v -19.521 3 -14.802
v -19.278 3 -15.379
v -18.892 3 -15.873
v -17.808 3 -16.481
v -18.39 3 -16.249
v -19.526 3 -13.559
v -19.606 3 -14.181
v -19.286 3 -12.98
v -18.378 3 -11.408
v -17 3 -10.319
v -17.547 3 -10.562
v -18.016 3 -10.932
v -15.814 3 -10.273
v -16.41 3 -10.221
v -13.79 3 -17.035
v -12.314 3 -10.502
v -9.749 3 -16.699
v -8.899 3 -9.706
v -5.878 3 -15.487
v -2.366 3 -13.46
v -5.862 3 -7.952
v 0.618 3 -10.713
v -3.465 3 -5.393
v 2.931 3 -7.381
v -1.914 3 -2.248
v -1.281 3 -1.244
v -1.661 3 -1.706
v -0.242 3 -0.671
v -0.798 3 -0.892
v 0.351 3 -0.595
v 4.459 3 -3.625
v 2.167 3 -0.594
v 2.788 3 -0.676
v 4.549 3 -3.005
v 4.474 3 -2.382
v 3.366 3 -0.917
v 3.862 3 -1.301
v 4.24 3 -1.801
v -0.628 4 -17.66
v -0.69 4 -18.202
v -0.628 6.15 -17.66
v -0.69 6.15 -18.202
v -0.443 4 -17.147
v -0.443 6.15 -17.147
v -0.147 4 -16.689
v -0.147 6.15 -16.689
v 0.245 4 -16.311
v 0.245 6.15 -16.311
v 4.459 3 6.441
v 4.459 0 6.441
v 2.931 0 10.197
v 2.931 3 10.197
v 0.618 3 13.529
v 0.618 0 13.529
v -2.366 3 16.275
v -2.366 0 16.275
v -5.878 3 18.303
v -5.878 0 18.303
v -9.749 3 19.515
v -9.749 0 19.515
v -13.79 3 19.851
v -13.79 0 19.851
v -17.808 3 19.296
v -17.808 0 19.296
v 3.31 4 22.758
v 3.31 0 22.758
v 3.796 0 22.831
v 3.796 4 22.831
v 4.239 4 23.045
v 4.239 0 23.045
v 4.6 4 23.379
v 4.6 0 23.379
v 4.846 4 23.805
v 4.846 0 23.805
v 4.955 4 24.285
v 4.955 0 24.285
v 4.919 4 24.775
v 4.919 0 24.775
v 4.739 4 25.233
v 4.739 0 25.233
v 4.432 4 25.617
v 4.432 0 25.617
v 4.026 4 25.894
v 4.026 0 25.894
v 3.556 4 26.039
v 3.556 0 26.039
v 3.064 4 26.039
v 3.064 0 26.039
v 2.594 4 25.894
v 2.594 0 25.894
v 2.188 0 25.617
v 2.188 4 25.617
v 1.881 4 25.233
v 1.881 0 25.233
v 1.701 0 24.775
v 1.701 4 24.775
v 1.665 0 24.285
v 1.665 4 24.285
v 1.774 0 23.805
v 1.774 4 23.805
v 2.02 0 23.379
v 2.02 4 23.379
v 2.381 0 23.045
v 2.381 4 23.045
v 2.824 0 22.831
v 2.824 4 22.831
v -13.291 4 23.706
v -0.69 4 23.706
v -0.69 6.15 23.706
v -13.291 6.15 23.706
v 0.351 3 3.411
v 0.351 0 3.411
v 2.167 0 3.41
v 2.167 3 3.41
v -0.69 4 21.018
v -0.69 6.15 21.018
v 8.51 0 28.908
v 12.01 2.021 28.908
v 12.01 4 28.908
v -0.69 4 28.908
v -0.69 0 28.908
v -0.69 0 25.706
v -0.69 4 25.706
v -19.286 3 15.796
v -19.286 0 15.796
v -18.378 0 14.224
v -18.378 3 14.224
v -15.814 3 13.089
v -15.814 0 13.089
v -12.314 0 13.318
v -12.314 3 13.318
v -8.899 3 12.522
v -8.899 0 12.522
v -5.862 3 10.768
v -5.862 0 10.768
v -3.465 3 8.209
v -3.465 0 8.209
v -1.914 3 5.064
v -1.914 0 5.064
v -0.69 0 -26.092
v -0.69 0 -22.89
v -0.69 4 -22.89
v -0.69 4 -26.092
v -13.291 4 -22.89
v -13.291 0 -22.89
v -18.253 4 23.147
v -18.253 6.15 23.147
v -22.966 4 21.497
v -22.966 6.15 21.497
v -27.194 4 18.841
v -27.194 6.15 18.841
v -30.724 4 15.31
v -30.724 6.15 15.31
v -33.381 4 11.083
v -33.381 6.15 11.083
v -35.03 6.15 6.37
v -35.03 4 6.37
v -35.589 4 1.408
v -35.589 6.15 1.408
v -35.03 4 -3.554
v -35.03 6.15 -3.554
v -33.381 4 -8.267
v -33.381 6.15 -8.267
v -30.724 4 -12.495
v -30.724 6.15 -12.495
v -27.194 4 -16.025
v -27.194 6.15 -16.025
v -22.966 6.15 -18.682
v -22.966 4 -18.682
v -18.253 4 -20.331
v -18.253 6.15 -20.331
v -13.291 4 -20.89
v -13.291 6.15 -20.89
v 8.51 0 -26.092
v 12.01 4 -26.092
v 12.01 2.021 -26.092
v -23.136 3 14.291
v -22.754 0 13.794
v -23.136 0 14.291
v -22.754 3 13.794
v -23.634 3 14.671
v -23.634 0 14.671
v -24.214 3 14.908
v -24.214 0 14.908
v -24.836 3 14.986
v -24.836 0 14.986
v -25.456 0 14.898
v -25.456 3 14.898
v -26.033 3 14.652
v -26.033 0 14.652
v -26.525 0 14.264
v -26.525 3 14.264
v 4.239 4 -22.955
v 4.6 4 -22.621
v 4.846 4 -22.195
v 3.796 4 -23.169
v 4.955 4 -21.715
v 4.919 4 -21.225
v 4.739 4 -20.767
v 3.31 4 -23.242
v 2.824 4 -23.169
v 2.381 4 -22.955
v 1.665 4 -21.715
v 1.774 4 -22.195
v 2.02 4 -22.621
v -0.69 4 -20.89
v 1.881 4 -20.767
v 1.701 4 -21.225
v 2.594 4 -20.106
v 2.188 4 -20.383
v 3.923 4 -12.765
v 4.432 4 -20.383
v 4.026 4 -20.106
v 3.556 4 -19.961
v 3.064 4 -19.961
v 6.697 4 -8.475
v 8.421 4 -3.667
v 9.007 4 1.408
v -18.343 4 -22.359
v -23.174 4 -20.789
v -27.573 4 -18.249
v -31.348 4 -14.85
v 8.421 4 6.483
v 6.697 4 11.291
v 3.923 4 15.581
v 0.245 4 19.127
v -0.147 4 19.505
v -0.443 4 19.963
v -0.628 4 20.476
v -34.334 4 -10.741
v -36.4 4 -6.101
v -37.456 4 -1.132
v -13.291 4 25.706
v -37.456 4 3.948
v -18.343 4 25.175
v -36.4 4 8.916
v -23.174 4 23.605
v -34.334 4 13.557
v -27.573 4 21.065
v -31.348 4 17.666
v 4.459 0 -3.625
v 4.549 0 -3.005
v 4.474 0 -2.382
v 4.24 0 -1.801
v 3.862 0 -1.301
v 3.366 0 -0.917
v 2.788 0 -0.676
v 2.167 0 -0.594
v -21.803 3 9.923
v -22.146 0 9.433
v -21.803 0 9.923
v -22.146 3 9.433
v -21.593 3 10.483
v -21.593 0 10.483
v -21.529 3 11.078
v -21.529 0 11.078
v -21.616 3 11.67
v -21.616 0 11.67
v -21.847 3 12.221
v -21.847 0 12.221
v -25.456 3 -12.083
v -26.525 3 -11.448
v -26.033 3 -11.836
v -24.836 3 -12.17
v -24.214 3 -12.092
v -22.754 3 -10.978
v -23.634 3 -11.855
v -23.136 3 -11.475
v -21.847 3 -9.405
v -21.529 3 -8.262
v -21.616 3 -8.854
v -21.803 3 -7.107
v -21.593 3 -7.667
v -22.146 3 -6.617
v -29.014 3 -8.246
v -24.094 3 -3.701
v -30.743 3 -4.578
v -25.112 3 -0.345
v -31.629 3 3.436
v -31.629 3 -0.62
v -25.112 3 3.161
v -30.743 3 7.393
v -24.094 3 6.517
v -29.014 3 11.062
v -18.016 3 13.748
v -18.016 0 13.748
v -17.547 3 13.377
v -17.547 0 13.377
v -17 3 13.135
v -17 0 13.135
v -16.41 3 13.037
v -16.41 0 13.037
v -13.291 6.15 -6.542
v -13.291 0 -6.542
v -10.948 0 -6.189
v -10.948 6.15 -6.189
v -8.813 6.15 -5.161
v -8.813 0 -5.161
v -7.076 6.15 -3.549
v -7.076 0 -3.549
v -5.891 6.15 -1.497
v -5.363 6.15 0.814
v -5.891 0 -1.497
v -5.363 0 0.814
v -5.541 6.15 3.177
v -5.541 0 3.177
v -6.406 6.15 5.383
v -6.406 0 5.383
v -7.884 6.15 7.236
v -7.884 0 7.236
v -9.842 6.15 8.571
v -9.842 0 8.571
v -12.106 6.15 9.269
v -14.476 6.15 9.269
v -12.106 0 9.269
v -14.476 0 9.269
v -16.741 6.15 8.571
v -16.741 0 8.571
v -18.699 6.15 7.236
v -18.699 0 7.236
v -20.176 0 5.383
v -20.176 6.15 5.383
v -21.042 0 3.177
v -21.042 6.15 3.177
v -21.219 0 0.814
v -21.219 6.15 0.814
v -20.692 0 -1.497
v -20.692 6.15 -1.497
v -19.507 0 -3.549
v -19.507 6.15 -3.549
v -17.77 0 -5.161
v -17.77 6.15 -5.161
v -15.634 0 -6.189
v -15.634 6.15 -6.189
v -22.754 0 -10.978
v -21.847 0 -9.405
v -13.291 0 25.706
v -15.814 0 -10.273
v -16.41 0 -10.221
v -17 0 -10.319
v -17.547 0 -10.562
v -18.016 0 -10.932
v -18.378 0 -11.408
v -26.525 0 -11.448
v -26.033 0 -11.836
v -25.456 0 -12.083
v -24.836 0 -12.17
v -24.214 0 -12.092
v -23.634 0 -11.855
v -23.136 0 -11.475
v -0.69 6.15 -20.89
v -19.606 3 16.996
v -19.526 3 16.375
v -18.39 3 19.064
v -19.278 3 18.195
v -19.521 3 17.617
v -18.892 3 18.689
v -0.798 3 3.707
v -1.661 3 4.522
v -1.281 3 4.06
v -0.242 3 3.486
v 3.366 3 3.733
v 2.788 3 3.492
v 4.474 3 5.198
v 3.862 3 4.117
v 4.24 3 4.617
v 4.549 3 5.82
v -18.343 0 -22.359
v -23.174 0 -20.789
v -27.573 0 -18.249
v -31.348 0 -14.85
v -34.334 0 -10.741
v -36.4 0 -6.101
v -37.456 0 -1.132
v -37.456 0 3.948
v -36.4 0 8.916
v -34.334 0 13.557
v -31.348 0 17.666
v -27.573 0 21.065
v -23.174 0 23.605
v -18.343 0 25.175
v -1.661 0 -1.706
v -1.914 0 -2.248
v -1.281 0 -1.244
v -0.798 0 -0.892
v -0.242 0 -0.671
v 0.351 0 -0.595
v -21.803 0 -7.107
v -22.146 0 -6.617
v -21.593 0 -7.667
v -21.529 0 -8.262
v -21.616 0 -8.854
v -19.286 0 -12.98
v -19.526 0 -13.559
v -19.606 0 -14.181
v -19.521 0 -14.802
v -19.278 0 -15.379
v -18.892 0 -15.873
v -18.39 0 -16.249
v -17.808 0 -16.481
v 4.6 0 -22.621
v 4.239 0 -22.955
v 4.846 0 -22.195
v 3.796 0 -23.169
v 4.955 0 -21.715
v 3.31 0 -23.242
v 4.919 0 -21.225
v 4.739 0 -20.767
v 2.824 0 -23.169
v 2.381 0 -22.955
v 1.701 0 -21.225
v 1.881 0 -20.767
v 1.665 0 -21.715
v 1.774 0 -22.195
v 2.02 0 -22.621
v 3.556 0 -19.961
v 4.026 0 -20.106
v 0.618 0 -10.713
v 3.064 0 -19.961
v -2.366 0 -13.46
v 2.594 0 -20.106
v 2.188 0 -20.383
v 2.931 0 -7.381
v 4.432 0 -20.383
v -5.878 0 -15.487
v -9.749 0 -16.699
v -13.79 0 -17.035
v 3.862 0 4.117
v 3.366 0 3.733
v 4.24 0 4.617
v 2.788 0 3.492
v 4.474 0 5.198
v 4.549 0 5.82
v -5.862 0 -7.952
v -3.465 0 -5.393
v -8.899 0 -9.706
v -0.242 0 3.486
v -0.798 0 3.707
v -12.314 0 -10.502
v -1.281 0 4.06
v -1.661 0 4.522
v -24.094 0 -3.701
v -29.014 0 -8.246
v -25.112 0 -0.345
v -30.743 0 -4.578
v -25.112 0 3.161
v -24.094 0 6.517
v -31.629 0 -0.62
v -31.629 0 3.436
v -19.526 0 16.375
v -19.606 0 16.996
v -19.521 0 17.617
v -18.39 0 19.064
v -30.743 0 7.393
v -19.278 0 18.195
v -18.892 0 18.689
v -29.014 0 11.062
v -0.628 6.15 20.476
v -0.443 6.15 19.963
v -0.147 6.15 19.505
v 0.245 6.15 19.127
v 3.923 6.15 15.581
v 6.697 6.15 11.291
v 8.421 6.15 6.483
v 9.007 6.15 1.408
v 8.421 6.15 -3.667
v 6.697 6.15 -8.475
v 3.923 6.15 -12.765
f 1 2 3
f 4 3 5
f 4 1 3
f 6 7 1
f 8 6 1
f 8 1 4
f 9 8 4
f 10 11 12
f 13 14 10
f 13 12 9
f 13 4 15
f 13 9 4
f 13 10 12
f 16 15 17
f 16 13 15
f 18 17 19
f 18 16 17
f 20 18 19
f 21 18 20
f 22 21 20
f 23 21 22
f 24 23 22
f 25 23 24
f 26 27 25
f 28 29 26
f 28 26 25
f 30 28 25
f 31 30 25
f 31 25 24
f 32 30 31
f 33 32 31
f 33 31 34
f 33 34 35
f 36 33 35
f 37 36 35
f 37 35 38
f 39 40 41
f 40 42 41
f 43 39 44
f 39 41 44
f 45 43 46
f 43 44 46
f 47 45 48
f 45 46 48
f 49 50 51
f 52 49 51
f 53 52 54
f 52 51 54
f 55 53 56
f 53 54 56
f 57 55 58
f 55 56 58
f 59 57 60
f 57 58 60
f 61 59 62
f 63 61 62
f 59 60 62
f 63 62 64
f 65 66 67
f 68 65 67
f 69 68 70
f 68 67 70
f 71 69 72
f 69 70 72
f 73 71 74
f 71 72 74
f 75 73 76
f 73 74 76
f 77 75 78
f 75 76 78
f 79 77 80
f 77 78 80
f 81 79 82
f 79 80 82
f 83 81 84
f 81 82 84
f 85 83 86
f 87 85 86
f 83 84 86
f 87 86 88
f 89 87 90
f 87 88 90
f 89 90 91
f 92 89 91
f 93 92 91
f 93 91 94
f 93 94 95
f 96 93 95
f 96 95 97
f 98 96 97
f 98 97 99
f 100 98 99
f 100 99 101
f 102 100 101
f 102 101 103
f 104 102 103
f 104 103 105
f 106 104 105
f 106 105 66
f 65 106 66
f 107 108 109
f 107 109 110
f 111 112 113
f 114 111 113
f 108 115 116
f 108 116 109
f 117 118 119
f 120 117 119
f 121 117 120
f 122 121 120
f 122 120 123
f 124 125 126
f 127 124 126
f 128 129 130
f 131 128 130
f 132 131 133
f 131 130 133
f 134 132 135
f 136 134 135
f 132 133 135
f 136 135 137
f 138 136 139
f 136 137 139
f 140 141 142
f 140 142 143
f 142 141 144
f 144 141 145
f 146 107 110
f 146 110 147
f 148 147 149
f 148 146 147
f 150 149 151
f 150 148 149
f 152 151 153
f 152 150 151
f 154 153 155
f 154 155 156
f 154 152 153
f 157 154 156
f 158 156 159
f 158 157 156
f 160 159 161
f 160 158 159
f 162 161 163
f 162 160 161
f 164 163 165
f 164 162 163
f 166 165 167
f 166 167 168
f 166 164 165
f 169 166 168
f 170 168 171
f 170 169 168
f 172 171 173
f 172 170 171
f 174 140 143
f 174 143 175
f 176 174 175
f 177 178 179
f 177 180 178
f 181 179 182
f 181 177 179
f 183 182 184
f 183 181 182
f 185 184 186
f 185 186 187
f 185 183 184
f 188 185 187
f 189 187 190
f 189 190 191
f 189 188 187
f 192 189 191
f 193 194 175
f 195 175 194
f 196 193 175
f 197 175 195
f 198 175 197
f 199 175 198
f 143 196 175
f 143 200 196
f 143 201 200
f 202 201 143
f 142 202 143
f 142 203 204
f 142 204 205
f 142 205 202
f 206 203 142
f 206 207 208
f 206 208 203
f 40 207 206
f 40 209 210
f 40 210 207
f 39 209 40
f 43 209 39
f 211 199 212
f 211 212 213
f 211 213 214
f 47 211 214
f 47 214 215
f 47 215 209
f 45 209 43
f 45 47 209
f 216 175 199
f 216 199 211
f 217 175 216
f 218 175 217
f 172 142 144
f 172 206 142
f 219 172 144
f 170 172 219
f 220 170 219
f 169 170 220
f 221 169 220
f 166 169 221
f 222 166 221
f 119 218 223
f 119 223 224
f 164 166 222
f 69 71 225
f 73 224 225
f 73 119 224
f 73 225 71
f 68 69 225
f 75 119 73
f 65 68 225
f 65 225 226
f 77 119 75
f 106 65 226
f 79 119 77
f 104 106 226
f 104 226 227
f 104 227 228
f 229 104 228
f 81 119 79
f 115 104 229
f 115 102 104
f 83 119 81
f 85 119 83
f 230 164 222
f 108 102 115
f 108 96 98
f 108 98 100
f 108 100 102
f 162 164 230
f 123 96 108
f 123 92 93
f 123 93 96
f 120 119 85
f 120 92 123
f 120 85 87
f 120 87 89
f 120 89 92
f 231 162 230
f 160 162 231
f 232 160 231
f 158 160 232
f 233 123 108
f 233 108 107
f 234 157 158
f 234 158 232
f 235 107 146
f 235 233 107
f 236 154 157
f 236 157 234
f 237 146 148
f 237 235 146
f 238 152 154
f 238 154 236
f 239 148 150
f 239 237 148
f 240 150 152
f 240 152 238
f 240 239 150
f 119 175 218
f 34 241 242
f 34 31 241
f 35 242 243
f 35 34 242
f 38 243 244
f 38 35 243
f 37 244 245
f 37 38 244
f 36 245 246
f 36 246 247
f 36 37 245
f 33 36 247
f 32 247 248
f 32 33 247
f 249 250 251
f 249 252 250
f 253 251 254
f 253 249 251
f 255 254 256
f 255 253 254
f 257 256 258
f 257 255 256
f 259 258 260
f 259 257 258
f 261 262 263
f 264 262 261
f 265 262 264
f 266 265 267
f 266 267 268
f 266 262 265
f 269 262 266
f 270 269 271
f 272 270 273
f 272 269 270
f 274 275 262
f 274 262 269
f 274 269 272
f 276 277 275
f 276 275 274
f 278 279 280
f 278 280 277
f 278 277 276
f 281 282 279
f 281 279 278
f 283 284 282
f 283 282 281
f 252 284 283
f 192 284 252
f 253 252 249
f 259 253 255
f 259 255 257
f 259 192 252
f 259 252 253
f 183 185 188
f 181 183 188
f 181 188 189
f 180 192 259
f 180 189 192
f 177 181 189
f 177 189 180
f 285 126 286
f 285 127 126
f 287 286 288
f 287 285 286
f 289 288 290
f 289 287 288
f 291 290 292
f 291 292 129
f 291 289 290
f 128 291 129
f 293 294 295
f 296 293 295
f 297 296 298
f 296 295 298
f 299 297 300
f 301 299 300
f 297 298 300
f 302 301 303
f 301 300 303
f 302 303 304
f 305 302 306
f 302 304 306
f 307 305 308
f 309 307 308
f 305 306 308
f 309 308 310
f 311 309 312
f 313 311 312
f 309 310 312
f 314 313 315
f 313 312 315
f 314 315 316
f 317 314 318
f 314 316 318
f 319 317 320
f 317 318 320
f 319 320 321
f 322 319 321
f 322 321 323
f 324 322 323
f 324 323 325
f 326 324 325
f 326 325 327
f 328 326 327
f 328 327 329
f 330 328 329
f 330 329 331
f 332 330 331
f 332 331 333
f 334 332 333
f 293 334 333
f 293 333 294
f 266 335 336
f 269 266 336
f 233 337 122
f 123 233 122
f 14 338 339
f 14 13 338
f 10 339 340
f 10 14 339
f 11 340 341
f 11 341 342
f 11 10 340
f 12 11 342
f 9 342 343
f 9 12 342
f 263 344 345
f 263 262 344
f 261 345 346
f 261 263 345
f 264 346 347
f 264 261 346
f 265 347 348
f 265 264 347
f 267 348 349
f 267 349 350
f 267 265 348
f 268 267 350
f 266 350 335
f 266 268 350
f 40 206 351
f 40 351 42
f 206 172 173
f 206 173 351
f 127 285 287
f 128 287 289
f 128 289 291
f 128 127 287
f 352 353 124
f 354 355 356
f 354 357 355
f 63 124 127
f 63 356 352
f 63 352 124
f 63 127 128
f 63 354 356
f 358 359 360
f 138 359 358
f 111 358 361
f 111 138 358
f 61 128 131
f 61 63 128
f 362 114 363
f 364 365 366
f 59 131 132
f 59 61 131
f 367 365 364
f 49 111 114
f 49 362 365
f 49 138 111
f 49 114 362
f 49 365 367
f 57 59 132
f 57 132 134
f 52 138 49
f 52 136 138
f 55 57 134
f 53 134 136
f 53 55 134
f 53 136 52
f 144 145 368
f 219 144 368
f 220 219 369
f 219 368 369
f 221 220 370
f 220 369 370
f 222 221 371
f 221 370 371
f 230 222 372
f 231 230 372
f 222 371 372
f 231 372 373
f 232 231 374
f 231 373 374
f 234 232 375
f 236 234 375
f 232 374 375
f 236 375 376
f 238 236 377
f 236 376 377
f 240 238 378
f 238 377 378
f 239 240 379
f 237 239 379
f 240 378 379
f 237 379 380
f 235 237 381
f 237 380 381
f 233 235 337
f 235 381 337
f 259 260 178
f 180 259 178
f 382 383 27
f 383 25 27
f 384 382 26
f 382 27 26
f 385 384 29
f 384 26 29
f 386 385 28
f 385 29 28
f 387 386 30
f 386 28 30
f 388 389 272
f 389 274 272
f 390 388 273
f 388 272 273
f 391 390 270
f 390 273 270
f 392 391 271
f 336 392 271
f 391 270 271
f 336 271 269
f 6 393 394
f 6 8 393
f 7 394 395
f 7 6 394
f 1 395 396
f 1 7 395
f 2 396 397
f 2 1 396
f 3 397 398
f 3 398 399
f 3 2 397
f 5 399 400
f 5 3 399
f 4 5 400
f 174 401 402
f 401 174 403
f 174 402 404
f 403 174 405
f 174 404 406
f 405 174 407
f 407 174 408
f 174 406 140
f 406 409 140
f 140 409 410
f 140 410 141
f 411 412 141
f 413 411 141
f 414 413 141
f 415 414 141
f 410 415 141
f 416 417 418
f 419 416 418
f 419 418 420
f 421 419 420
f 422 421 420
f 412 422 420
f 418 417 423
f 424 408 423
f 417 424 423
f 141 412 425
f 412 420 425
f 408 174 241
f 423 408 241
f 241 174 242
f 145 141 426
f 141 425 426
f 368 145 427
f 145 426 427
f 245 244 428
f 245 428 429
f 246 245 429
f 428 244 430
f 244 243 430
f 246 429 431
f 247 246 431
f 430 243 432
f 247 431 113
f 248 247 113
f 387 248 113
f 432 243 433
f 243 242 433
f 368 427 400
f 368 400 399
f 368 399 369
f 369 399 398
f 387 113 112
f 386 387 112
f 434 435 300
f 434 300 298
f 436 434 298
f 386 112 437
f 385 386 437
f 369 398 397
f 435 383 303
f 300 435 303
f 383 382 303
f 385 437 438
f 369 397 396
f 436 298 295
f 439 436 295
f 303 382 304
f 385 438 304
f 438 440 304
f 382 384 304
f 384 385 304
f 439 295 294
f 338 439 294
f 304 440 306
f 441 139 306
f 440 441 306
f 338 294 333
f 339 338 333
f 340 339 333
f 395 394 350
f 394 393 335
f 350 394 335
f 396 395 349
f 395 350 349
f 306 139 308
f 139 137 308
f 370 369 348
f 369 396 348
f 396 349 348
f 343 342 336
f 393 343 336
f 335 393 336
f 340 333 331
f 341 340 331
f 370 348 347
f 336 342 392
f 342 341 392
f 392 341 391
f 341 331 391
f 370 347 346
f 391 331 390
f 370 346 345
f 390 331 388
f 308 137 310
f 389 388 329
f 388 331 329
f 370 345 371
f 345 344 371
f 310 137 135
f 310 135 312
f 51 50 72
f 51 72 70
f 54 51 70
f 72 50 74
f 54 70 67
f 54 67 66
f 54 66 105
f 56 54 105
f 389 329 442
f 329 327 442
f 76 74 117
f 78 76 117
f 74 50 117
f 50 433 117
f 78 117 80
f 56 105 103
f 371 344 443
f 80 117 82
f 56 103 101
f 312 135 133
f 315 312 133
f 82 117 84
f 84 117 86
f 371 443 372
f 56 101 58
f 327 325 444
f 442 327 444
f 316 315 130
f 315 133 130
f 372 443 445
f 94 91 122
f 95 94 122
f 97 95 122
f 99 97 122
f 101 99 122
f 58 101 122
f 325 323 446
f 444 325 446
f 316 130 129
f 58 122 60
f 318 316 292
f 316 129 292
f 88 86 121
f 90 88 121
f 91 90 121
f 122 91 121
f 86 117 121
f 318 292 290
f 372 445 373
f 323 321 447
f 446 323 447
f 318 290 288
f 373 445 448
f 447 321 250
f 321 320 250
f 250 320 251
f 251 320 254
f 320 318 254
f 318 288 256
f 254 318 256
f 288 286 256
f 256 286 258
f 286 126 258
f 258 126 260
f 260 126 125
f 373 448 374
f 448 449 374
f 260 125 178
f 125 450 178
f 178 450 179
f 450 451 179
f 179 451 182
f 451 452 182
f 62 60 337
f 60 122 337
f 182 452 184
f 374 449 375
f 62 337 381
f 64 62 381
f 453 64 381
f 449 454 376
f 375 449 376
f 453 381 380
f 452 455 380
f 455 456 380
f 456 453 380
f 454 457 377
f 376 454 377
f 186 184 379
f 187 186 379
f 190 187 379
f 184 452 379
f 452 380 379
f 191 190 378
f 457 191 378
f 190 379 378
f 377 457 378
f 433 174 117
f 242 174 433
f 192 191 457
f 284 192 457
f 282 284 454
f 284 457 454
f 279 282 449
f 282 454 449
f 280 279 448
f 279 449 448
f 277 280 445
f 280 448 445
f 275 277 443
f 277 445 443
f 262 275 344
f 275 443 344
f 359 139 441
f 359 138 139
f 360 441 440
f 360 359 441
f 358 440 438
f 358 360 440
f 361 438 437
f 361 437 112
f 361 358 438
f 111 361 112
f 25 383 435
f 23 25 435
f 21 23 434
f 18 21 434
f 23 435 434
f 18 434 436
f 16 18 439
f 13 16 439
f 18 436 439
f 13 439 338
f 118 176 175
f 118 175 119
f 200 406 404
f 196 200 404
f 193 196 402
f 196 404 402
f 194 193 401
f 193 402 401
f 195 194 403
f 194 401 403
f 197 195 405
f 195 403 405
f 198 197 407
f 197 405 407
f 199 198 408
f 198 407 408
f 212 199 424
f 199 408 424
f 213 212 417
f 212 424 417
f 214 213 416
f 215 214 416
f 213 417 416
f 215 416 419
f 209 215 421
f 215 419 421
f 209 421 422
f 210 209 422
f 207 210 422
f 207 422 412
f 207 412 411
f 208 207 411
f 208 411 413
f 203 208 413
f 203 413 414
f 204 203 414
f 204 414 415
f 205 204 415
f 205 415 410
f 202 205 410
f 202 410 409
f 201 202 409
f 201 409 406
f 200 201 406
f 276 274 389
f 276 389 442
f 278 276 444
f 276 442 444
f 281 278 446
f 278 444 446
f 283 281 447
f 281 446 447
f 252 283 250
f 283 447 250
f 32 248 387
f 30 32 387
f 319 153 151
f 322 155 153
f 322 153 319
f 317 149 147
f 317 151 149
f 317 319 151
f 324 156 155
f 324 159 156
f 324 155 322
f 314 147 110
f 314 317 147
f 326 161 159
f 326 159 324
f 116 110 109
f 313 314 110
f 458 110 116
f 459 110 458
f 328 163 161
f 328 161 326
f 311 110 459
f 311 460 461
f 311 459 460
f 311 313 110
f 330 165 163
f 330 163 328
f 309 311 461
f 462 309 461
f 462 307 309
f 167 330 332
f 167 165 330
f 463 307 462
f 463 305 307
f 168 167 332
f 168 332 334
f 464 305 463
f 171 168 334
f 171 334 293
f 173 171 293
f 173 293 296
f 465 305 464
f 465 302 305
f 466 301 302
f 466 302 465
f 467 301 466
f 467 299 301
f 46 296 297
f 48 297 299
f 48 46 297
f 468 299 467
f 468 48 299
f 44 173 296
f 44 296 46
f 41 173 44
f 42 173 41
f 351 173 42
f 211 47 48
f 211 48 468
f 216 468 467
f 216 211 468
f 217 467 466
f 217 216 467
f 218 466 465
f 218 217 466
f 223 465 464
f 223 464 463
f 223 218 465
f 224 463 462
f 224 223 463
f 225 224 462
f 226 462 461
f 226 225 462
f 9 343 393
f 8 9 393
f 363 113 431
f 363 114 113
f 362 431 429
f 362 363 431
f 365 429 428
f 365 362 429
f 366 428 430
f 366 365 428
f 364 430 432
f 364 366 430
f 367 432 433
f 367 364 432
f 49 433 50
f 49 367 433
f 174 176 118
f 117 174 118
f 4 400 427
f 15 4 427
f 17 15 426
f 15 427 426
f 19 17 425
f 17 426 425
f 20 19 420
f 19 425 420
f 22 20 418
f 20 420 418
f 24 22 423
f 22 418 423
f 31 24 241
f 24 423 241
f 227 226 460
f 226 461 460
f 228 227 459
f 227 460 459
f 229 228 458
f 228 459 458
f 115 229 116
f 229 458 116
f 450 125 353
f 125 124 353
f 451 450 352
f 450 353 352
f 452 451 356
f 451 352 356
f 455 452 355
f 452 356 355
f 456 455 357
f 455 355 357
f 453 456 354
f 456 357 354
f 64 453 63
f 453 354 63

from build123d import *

# Parameters (mm, degrees)
BOSS_EXTRUDE1_DEPTH = 4
BOSS_EXTRUDE2_DEPTH = 2.25
SKETCH3_R           = 7.95
CUT_EXTRUDE1_DEPTH  = 9.25
SKETCH4_R           = 1.65
CUT_EXTRUDE2_DEPTH  = 9.25
CUT_EXTRUDE3_DEPTH  = 3
FILLET1_R           = 2.38125
CHAMFER1_SIZE       = 3.5
CHAMFER1_SIZE2      = 2.020725942
BOSS_EXTRUDE3_DEPTH = 4
SKETCH7_W           = 56.562445917
SKETCH7_H           = 51.963873078
CUT_EXTRUDE4_DEPTH  = 0.1
FILLET3_R           = 2.38


with BuildPart() as part:
    # Sketch1 → Boss-Extrude1 (new body)
    with BuildSketch(Plane(origin=(0, 0, 0), x_dir=(1, 0, 0), z_dir=(0, 1, 0))):
        with BuildLine():
            Line((-13.29118379, 20.889836125), (-0.68999579, 20.889836125))
            Line((-0.68999579, 20.889836125), (-0.68999579, 24.09210312))
            Line((-0.68999579, 24.09210312), (-0.68999579, 26.09210312))
            Line((-0.68999579, 26.09210312), (12.01000421, 26.09210312))
            Line((12.01000421, 26.09210312), (12.01000421, 24.09210312))
            Line((12.01000421, 24.09210312), (12.01000421, -26.90789688))
            Line((12.01000421, -26.90789688), (12.01000421, -28.90789688))
            Line((12.01000421, -28.90789688), (-0.68999579, -28.90789688))
            Line((-0.68999579, -28.90789688), (-0.68999579, -26.90789688))
            Line((-0.68999579, -26.90789688), (-0.68999579, -23.705629885))
            Line((-0.68999579, -23.705629885), (-13.29118379, -23.705629885))
            ThreePointArc((-13.29118379, -23.705629885), (-35.588916795, -1.40789688), (-13.29118379, 20.889836125))
        make_face()
    extrude(amount=BOSS_EXTRUDE1_DEPTH)

    # Sketch2 → Boss-Extrude2 (add)
    with BuildSketch(Plane(origin=(0, 4, 0), x_dir=(1, 0, 0), z_dir=(0, 1, 0))):
        with BuildLine():
            Line((-0.68999579, 20.889836125), (-0.68999579, 16.987726462))
            ThreePointArc((-0.68999579, 16.987726462), (9.006549215, -1.40789688), (-0.68999579, -19.803520222))
            Line((-0.68999579, -19.803520222), (-0.68999579, -23.705629885))
            Line((-0.68999579, -23.705629885), (-13.29118379, -23.705629885))
            ThreePointArc((-13.29118379, -23.705629885), (-35.588916795, -1.40789688), (-13.29118379, 20.889836125))
            Line((-13.29118379, 20.889836125), (-0.68999579, 20.889836125))
        make_face()
    extrude(amount=BOSS_EXTRUDE2_DEPTH)

    # Sketch3 → Cut-Extrude1 (cut)
    with BuildSketch(Plane.XZ):
        with Locations((-13.29118379, 1.40789688)):
            Circle(SKETCH3_R)
    extrude(amount=-CUT_EXTRUDE1_DEPTH, mode=Mode.SUBTRACT)

    # Sketch4 → Cut-Extrude2 (cut)
    with BuildSketch(Plane.XZ):
        with Locations((3.31000421, -21.59210312)):
            Circle(SKETCH4_R)
        with Locations((3.31000421, 24.40789688)):
            Circle(SKETCH4_R)
    extrude(amount=-CUT_EXTRUDE2_DEPTH, mode=Mode.SUBTRACT)

    # Sketch5 → Cut-Extrude3 (cut)
    with BuildSketch(Plane.XZ):
        with BuildLine():
            ThreePointArc((-20.917233099, -7.792422241), (-25.24118379, 1.40789688), (-20.917233099, 10.608216001))
            Line((-20.917233099, 10.608216001), (-24.193916765, 16.291878661))
            ThreePointArc((-24.193916765, 16.291878661), (-31.74118379, 1.40789688), (-24.193916765, -13.476084902))
            Line((-24.193916765, -13.476084902), (-20.917233099, -7.792422241))
        make_face()
        with BuildLine():
            Line((-20.729723635, 18.291931497), (-17.445869217, 12.612408873))
            ThreePointArc((-17.445869217, 12.612408873), (-7.31618379, 11.756900455), (-1.510449053, 3.412089752))
            Line((-1.510449053, 3.412089752), (5.05008903, 3.407949716))
            ThreePointArc((5.05008903, 3.407949716), (-4.06618379, 17.38606558), (-20.729723635, 18.291931497))
        make_face()
        with BuildLine():
            ThreePointArc((-1.510449053, -0.596295992), (-7.31618379, -8.941106696), (-17.445869217, -9.796615113))
            Line((-17.445869217, -9.796615113), (-20.729723635, -15.476137738))
            ThreePointArc((-20.729723635, -15.476137738), (-4.06618379, -14.57027182), (5.05008903, -0.592155956))
            Line((5.05008903, -0.592155956), (-1.510449053, -0.596295992))
        make_face()
    extrude(amount=-CUT_EXTRUDE3_DEPTH, mode=Mode.SUBTRACT)

    # Fillet1
    fillet1_edges = [part.edges().sort_by_distance(p)[0] for p in [
        (5.05008903, 1.5, 3.407949716),
        (-1.510449053, 1.5, 3.412089752),
        (5.05008903, 1.5, -0.592155956),
        (-24.193916765, 1.5, 16.291878661),
        (-20.729723635, 1.5, 18.291931497),
        (-1.510449053, 1.5, -0.596295992),
        (-20.729723635, 1.5, -15.476137738),
        (-20.917233099, 1.5, 10.608216001),
        (-20.917233099, 1.5, -7.792422241),
        (-24.193916765, 1.5, -13.476084902),
        (-17.445869217, 1.5, -9.796615113),
        (-17.445869217, 1.5, 12.612408873),
    ]]
    fillet(fillet1_edges, radius=FILLET1_R)

    # Chamfer1
    chamfer1_edges = [part.edges().sort_by_distance(p)[0] for p in [
        (12.01000421, 0, 1.40789688),
    ]]
    chamfer1_side = [part.faces().sort_by_distance(p)[0] for p in [
        (-3.702499267, 0, 18.015985651),
    ]]
    chamfer(chamfer1_edges, length=CHAMFER1_SIZE, length2=CHAMFER1_SIZE2, reference=chamfer1_side[0])

    # Sketch6 → Boss-Extrude3 (add)
    with BuildSketch(Plane.XZ):
        with BuildLine():
            Line((-0.68999579, -22.889836125), (-13.29118379, -22.889836125))
            ThreePointArc((-13.29118379, -22.889836125), (-37.588916795, 1.40789688), (-13.29118379, 25.705629885))
            Line((-13.29118379, 25.705629885), (-0.68999579, 25.705629885))
            Line((-0.68999579, 25.705629885), (-0.68999579, 23.705629885))
            Line((-0.68999579, 23.705629885), (-13.29118379, 23.705629885))
            ThreePointArc((-13.29118379, 23.705629885), (-35.588916795, 1.40789688), (-13.29118379, -20.889836125))
            Line((-13.29118379, -20.889836125), (-0.68999579, -20.889836125))
            Line((-0.68999579, -20.889836125), (-0.68999579, -22.889836125))
        make_face()
    extrude(amount=-BOSS_EXTRUDE3_DEPTH)

    # Sketch7 → Cut-Extrude4 (cut)
    with BuildSketch(Plane(origin=(0, 6.25, 0), x_dir=(1, 0, 0), z_dir=(0, 1, 0))):
        with Locations((-12.789456293, -2.500057929)):
            Rectangle(SKETCH7_W, SKETCH7_H)
    extrude(amount=-CUT_EXTRUDE4_DEPTH, mode=Mode.SUBTRACT)

    # Fillet3
    fillet3_edges = [part.edges().sort_by_distance(p)[0] for p in [
        (-0.68999579, 5.075, -16.987726462),
        (-0.68999579, 5.075, 19.803520222),
    ]]
    fillet(fillet3_edges, radius=FILLET3_R)


solid = part.part
